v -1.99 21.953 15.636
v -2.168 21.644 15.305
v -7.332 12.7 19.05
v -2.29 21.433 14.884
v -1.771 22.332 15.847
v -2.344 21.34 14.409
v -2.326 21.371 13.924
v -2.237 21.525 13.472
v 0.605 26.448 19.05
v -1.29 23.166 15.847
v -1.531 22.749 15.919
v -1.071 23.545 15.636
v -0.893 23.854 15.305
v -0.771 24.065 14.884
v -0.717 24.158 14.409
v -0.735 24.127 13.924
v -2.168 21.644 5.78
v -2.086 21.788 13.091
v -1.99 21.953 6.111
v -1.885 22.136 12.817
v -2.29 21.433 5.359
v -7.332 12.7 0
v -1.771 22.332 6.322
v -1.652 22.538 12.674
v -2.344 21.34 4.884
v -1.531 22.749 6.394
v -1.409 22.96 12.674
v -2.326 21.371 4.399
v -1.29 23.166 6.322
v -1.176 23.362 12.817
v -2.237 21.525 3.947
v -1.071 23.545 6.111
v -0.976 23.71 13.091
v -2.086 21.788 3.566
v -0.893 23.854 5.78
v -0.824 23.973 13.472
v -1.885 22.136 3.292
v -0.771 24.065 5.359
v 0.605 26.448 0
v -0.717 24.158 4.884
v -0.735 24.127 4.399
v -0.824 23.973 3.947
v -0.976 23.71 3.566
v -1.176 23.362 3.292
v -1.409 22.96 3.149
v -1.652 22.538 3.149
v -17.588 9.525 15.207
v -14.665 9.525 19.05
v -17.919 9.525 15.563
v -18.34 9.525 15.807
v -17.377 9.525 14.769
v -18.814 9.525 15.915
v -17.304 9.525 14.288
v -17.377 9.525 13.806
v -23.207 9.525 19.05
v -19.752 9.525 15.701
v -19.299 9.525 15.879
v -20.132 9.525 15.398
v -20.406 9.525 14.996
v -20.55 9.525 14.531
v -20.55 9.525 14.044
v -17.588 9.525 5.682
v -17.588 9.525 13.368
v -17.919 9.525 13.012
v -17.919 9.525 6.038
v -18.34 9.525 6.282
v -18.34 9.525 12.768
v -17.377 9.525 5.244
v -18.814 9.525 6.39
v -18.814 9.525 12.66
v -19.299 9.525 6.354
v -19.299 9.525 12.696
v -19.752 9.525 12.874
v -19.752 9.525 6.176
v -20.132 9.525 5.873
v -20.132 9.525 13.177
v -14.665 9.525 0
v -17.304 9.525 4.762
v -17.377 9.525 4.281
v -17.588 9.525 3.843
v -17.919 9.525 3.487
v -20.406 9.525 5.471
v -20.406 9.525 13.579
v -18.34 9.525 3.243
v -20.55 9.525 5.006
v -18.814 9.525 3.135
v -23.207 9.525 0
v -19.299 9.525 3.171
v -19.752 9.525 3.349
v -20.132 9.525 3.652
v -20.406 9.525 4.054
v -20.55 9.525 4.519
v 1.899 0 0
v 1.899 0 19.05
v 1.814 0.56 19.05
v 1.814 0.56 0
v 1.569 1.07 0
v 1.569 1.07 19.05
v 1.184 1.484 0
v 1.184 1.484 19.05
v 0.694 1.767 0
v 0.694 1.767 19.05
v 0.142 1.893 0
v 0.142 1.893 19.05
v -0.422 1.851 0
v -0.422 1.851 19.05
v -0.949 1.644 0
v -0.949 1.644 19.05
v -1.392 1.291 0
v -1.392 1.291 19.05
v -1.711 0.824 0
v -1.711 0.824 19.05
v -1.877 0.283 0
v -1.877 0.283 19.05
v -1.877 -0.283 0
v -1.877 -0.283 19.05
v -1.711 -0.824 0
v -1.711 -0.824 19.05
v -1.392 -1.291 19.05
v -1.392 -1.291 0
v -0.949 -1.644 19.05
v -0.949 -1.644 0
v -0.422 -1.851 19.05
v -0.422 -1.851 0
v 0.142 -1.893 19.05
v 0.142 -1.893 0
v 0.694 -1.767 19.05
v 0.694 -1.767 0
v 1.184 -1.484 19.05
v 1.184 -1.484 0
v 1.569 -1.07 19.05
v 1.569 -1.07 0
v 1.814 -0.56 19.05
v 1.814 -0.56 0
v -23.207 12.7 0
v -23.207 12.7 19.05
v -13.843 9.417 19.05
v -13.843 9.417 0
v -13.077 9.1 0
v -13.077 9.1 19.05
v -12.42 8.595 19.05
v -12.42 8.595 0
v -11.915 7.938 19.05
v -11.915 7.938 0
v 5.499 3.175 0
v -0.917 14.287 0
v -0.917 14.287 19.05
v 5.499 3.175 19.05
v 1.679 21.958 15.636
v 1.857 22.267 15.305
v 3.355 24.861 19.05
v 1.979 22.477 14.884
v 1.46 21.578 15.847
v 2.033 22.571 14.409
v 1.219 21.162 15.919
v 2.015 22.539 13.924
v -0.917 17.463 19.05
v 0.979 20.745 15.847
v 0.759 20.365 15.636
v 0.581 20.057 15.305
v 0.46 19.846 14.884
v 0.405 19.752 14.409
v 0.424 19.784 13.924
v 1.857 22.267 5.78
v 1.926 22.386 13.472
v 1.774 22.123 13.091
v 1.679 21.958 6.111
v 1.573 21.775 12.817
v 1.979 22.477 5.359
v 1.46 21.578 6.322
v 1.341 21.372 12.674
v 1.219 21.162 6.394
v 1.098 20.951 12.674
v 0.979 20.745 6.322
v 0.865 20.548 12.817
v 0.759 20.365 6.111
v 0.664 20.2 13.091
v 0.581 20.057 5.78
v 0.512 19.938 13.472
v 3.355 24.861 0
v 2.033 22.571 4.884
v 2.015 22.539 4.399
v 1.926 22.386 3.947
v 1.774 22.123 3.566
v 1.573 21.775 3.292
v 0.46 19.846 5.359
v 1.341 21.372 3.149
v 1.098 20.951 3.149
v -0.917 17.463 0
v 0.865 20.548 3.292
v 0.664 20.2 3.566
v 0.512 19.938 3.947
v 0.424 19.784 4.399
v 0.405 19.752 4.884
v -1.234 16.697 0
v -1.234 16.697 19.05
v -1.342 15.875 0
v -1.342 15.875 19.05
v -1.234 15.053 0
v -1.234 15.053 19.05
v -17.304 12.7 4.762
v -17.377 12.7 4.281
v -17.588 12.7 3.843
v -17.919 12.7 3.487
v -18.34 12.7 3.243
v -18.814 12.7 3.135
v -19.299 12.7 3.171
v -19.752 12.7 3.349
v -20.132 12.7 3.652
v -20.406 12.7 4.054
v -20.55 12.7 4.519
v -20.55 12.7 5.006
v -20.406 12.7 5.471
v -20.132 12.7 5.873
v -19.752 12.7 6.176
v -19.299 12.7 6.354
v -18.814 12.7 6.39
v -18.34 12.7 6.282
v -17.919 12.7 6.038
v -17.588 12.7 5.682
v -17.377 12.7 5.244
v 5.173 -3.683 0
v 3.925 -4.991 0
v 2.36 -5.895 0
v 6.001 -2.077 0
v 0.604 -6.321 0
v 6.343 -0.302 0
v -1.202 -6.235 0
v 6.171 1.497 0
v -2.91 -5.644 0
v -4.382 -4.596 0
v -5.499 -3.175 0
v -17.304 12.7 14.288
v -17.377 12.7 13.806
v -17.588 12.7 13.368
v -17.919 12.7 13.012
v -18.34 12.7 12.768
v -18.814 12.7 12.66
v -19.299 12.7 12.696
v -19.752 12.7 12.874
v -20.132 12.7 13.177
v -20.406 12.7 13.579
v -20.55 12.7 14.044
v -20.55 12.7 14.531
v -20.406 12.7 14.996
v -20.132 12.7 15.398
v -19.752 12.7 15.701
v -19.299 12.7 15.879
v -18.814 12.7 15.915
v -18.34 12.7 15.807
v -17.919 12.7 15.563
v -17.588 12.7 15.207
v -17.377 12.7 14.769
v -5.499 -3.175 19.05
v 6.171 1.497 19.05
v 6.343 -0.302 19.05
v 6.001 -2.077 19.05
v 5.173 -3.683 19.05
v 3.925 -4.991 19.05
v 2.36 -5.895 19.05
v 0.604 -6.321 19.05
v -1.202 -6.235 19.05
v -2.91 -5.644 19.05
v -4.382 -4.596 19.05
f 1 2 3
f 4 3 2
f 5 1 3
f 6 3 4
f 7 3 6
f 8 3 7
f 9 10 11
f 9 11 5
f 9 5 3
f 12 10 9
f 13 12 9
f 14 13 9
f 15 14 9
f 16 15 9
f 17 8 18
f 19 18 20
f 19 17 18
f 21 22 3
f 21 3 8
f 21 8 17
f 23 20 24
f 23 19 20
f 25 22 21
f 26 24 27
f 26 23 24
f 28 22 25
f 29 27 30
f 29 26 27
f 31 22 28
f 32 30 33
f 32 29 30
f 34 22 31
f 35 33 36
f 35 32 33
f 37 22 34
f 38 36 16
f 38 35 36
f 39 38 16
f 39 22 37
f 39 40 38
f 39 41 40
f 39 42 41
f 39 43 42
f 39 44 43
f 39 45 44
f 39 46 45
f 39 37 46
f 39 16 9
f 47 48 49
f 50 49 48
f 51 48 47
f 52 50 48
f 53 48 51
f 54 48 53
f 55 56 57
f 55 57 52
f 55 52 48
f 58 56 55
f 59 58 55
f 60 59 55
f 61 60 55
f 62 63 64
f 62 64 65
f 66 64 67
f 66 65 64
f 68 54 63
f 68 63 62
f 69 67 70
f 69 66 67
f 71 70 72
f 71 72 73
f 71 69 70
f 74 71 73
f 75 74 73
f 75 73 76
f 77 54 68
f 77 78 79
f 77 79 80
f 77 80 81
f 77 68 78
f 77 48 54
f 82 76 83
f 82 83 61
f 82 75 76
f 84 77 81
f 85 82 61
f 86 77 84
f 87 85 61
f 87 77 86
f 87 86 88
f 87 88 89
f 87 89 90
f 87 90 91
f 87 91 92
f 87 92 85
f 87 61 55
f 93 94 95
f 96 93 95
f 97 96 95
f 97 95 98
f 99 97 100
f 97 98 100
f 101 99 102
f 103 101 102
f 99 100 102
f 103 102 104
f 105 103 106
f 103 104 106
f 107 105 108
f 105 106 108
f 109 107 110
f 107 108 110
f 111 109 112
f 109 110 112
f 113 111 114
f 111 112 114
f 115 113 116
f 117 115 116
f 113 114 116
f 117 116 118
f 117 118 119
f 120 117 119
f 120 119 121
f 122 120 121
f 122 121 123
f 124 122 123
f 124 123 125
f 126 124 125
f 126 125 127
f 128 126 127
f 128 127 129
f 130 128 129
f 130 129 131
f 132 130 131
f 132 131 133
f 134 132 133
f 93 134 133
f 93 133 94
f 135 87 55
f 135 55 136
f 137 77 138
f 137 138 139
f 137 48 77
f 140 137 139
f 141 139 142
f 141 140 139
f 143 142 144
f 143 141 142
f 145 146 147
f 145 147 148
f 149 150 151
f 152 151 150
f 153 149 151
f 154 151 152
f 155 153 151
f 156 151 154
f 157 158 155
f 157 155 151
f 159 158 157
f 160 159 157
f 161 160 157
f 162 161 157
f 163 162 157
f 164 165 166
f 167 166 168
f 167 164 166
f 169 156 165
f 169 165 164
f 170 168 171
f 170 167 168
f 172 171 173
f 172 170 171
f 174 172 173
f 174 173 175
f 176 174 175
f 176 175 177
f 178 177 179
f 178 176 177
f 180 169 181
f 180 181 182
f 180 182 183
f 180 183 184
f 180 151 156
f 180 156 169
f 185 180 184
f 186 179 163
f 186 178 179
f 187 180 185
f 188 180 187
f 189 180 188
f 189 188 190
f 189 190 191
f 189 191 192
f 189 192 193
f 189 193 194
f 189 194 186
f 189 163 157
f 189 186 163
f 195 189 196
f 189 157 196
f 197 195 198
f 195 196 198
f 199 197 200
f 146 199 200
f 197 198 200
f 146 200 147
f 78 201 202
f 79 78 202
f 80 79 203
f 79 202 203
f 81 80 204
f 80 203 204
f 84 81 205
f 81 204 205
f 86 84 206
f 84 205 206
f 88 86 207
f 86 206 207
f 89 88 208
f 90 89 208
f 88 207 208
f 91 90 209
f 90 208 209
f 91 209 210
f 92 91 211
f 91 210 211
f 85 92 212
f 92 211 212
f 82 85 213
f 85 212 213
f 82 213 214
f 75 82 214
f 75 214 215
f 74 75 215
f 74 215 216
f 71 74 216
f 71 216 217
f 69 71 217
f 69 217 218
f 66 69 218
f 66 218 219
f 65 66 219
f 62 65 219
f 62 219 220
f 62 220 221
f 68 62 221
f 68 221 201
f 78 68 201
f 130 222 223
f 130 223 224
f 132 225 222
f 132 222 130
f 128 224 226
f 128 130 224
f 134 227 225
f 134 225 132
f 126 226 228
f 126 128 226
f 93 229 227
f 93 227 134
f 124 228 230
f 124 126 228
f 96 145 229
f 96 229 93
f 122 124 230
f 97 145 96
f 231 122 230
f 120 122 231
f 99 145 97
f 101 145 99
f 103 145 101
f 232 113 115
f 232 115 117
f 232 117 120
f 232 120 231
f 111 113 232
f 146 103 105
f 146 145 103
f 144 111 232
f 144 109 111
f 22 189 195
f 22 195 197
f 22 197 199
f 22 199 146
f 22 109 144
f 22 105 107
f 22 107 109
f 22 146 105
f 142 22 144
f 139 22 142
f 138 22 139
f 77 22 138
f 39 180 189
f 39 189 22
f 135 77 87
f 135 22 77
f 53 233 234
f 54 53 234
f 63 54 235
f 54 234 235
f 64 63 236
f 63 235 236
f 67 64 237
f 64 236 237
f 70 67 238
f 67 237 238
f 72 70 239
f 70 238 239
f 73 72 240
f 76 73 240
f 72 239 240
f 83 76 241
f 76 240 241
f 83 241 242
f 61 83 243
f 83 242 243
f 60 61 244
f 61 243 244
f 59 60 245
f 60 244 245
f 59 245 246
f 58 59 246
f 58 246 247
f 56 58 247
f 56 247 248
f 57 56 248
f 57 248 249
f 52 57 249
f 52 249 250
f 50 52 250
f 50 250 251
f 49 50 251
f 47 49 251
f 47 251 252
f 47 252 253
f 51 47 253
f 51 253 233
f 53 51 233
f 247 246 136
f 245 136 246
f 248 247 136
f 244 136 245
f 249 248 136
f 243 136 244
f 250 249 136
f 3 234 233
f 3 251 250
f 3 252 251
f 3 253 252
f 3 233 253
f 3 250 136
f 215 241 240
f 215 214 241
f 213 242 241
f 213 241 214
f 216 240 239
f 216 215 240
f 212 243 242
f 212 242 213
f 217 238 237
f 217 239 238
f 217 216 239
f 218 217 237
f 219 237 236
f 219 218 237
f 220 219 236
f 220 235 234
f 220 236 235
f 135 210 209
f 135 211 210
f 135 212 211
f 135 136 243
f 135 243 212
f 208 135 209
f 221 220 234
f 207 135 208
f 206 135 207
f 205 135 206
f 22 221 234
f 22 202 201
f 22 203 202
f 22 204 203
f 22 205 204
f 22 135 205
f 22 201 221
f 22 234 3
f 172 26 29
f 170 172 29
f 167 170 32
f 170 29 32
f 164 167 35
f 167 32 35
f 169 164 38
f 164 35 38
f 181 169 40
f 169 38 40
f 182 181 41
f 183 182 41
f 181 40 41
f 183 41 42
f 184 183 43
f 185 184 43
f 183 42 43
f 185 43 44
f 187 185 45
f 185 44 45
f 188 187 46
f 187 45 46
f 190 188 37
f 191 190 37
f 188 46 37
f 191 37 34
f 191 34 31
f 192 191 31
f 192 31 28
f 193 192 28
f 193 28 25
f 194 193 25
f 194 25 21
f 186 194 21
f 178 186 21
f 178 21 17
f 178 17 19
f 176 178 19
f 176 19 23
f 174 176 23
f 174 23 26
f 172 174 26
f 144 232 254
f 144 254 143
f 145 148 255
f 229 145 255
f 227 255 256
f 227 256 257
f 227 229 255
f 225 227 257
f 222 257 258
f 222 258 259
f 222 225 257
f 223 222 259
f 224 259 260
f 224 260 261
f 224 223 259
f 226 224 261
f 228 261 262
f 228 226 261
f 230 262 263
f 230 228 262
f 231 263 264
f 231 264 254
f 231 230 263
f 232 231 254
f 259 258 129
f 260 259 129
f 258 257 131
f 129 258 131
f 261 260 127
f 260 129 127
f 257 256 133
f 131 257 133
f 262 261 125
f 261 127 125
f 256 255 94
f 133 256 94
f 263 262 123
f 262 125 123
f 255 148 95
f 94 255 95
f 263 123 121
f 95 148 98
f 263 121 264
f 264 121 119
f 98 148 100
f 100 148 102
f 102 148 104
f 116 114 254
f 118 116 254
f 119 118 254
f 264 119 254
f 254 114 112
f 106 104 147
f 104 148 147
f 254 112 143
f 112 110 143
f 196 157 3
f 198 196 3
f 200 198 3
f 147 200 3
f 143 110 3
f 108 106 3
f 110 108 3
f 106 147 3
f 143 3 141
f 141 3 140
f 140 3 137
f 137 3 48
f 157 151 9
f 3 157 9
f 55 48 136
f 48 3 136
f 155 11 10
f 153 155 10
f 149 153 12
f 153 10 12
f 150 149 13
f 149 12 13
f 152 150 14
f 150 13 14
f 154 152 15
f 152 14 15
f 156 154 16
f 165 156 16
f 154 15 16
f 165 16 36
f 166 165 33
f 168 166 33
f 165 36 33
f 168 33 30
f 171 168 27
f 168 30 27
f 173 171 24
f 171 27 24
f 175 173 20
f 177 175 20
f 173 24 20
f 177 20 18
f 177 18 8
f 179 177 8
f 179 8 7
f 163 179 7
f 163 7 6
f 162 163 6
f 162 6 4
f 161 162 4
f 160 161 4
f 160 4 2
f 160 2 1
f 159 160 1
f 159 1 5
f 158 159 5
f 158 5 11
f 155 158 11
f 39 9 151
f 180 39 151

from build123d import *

# Parameters (mm, degrees)
BOSS_EXTRUDE1_DEPTH     = 19.05
F_6_CLEARANCE_HOLE1_D   = 3.7973
FILLET1_R               = 3.175
E_0_25_DIAMETER_HOLE1_D = 3.2639
E_0_25_DIAMETER_HOLE2_D = 3.2639


with BuildPart() as part:
    # Sketch1 → Boss-Extrude1 (new body)
    with BuildSketch(Plane.XY):
        with BuildLine():
            Line((-7.332348419, 12.7), (0.605151581, 26.448153285))
            Line((0.605151581, 26.448153285), (3.354782238, 24.860653285))
            Line((3.354782238, 24.860653285), (-1.833087105, 15.875))
            Line((-1.833087105, 15.875), (5.499261314, 3.175))
            ThreePointArc((5.499261314, 3.175), (3.175, -5.499261314), (-5.499261314, -3.175))
            Line((-5.499261314, -3.175), (-12.831609733, 9.525))
            Line((-12.831609733, 9.525), (-23.207348419, 9.525))
            Line((-23.207348419, 9.525), (-23.207348419, 12.7))
            Line((-23.207348419, 12.7), (-7.332348419, 12.7))
        make_face()
    extrude(amount=BOSS_EXTRUDE1_DEPTH)

    # #6 Clearance Hole1 (through all)
    with Locations(Plane(origin=(0, 0, 0), x_dir=(-1, 0, 0), z_dir=(0, 0, -1))):
        with Locations((0, 0)):
            Hole(F_6_CLEARANCE_HOLE1_D / 2)

    # Fillet1
    fillet1_edges = [part.edges().sort_by_distance(p)[0] for p in [
        (-1.833087105, 15.875, 9.525),
        (-12.831609733, 9.525, 9.525),
    ]]
    fillet(fillet1_edges, radius=FILLET1_R)

    # E (0.25) Diameter Hole1 (through all)
    with Locations(Plane(origin=(-8.248891971, 4.7625, 0), x_dir=(0, 0, -1), z_dir=(0.86602540378444, -0.49999999999999784, 0))):
        with Locations((-4.7625, 18.936022628), (-14.2875, 18.936022628)):
            Hole(E_0_25_DIAMETER_HOLE1_D / 2)

    # E (0.25) Diameter Hole2 (through all)
    with Locations(Plane(origin=(-18.936022628, 9.525, 14.2875), x_dir=(-1, 0, 0), z_dir=(0, -1, 0))):
        with Locations((0, 0), (0, 9.525)):
            Hole(E_0_25_DIAMETER_HOLE2_D / 2)


solid = part.part
